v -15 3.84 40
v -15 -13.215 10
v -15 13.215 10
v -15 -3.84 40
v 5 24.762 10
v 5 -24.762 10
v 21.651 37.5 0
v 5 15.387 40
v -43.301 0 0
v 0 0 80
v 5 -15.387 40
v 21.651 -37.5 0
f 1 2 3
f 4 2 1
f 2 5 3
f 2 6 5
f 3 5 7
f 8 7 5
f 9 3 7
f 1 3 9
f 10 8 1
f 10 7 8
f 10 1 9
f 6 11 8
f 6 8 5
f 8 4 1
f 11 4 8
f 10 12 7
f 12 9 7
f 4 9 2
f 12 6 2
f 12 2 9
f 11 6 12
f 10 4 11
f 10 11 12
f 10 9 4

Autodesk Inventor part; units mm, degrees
ref_plane "YZ Plane" through (0, 0, 0) normal (1, 0, 0) x (0, 1, 0)
ref_plane "XZ Plane" through (0, 0, 0) normal (0, 1, 0) x (-1, 0, 0)
sketch "Эскиз1" plane through (0, 0, 0) normal (0, 0, 1) x (1, 0, 0)
  line L0 (-43.3013, 0) -> (21.6506, 37.5)
  line L1 (21.6506, 37.5) -> (21.6506, -37.5)
  line L2 (21.6506, -37.5) -> (-43.3013, 0)
  point P0 (0, 0)
  point P1 (0, 0)
  dimension "d2" = 75
ref_plane "РабПлоскость1" through (0, 0, 80) normal (0, 0, 1) x (1, 0, 0)
sketch "Эскиз2" plane through (0, 0, 80) normal (0, 0, 1) x (1, 0, 0)
  point P0 (0, 0)
  point P1 (0, 0)
loft "Лофт1" add profiles "Эскиз1" section 2 point at (0, 0, 80)
sketch "Эскиз3" plane through (0, 0, 0) normal (0, 1, 0) x (-1, 0, 0)
  point P0 (0, 0)
sketch "Эскиз4" plane through (0, 0, 0) normal (0, 1, 0) x (-1, 0, 0)
  line L0 (-5, 10) -> (15, 10)
  line L1 (15, 10) -> (15, 40)
  line L2 (15, 40) -> (-5, 40)
  line L3 (-5, 40) -> (-5, 10)
  line L4 (-5, 10) -> (15, 40) construction
  line L5 (15, 10) -> (-5, 40) construction
  point P0 (0, 0)
  point P1 (0, 0)
  point P2 (5, 25)
  dimension "d8" = 20
  dimension "d9" = 30
  dimension "d10" = 15
  dimension "d12" = 10
extrude "Выдавливание1" cut sketch "Эскиз4" along normal through all both and the other way through all
sketch "Эскиз5" plane through (21.6506, -37.5, 0) normal (-0.4826376, -0.8359528, 0.2612353) x (0.8428609, -0.3622752, 0.3979224)
  point P0 (-31.8338, 20.6119)
properties part number "ДЗ2 Курганова"
